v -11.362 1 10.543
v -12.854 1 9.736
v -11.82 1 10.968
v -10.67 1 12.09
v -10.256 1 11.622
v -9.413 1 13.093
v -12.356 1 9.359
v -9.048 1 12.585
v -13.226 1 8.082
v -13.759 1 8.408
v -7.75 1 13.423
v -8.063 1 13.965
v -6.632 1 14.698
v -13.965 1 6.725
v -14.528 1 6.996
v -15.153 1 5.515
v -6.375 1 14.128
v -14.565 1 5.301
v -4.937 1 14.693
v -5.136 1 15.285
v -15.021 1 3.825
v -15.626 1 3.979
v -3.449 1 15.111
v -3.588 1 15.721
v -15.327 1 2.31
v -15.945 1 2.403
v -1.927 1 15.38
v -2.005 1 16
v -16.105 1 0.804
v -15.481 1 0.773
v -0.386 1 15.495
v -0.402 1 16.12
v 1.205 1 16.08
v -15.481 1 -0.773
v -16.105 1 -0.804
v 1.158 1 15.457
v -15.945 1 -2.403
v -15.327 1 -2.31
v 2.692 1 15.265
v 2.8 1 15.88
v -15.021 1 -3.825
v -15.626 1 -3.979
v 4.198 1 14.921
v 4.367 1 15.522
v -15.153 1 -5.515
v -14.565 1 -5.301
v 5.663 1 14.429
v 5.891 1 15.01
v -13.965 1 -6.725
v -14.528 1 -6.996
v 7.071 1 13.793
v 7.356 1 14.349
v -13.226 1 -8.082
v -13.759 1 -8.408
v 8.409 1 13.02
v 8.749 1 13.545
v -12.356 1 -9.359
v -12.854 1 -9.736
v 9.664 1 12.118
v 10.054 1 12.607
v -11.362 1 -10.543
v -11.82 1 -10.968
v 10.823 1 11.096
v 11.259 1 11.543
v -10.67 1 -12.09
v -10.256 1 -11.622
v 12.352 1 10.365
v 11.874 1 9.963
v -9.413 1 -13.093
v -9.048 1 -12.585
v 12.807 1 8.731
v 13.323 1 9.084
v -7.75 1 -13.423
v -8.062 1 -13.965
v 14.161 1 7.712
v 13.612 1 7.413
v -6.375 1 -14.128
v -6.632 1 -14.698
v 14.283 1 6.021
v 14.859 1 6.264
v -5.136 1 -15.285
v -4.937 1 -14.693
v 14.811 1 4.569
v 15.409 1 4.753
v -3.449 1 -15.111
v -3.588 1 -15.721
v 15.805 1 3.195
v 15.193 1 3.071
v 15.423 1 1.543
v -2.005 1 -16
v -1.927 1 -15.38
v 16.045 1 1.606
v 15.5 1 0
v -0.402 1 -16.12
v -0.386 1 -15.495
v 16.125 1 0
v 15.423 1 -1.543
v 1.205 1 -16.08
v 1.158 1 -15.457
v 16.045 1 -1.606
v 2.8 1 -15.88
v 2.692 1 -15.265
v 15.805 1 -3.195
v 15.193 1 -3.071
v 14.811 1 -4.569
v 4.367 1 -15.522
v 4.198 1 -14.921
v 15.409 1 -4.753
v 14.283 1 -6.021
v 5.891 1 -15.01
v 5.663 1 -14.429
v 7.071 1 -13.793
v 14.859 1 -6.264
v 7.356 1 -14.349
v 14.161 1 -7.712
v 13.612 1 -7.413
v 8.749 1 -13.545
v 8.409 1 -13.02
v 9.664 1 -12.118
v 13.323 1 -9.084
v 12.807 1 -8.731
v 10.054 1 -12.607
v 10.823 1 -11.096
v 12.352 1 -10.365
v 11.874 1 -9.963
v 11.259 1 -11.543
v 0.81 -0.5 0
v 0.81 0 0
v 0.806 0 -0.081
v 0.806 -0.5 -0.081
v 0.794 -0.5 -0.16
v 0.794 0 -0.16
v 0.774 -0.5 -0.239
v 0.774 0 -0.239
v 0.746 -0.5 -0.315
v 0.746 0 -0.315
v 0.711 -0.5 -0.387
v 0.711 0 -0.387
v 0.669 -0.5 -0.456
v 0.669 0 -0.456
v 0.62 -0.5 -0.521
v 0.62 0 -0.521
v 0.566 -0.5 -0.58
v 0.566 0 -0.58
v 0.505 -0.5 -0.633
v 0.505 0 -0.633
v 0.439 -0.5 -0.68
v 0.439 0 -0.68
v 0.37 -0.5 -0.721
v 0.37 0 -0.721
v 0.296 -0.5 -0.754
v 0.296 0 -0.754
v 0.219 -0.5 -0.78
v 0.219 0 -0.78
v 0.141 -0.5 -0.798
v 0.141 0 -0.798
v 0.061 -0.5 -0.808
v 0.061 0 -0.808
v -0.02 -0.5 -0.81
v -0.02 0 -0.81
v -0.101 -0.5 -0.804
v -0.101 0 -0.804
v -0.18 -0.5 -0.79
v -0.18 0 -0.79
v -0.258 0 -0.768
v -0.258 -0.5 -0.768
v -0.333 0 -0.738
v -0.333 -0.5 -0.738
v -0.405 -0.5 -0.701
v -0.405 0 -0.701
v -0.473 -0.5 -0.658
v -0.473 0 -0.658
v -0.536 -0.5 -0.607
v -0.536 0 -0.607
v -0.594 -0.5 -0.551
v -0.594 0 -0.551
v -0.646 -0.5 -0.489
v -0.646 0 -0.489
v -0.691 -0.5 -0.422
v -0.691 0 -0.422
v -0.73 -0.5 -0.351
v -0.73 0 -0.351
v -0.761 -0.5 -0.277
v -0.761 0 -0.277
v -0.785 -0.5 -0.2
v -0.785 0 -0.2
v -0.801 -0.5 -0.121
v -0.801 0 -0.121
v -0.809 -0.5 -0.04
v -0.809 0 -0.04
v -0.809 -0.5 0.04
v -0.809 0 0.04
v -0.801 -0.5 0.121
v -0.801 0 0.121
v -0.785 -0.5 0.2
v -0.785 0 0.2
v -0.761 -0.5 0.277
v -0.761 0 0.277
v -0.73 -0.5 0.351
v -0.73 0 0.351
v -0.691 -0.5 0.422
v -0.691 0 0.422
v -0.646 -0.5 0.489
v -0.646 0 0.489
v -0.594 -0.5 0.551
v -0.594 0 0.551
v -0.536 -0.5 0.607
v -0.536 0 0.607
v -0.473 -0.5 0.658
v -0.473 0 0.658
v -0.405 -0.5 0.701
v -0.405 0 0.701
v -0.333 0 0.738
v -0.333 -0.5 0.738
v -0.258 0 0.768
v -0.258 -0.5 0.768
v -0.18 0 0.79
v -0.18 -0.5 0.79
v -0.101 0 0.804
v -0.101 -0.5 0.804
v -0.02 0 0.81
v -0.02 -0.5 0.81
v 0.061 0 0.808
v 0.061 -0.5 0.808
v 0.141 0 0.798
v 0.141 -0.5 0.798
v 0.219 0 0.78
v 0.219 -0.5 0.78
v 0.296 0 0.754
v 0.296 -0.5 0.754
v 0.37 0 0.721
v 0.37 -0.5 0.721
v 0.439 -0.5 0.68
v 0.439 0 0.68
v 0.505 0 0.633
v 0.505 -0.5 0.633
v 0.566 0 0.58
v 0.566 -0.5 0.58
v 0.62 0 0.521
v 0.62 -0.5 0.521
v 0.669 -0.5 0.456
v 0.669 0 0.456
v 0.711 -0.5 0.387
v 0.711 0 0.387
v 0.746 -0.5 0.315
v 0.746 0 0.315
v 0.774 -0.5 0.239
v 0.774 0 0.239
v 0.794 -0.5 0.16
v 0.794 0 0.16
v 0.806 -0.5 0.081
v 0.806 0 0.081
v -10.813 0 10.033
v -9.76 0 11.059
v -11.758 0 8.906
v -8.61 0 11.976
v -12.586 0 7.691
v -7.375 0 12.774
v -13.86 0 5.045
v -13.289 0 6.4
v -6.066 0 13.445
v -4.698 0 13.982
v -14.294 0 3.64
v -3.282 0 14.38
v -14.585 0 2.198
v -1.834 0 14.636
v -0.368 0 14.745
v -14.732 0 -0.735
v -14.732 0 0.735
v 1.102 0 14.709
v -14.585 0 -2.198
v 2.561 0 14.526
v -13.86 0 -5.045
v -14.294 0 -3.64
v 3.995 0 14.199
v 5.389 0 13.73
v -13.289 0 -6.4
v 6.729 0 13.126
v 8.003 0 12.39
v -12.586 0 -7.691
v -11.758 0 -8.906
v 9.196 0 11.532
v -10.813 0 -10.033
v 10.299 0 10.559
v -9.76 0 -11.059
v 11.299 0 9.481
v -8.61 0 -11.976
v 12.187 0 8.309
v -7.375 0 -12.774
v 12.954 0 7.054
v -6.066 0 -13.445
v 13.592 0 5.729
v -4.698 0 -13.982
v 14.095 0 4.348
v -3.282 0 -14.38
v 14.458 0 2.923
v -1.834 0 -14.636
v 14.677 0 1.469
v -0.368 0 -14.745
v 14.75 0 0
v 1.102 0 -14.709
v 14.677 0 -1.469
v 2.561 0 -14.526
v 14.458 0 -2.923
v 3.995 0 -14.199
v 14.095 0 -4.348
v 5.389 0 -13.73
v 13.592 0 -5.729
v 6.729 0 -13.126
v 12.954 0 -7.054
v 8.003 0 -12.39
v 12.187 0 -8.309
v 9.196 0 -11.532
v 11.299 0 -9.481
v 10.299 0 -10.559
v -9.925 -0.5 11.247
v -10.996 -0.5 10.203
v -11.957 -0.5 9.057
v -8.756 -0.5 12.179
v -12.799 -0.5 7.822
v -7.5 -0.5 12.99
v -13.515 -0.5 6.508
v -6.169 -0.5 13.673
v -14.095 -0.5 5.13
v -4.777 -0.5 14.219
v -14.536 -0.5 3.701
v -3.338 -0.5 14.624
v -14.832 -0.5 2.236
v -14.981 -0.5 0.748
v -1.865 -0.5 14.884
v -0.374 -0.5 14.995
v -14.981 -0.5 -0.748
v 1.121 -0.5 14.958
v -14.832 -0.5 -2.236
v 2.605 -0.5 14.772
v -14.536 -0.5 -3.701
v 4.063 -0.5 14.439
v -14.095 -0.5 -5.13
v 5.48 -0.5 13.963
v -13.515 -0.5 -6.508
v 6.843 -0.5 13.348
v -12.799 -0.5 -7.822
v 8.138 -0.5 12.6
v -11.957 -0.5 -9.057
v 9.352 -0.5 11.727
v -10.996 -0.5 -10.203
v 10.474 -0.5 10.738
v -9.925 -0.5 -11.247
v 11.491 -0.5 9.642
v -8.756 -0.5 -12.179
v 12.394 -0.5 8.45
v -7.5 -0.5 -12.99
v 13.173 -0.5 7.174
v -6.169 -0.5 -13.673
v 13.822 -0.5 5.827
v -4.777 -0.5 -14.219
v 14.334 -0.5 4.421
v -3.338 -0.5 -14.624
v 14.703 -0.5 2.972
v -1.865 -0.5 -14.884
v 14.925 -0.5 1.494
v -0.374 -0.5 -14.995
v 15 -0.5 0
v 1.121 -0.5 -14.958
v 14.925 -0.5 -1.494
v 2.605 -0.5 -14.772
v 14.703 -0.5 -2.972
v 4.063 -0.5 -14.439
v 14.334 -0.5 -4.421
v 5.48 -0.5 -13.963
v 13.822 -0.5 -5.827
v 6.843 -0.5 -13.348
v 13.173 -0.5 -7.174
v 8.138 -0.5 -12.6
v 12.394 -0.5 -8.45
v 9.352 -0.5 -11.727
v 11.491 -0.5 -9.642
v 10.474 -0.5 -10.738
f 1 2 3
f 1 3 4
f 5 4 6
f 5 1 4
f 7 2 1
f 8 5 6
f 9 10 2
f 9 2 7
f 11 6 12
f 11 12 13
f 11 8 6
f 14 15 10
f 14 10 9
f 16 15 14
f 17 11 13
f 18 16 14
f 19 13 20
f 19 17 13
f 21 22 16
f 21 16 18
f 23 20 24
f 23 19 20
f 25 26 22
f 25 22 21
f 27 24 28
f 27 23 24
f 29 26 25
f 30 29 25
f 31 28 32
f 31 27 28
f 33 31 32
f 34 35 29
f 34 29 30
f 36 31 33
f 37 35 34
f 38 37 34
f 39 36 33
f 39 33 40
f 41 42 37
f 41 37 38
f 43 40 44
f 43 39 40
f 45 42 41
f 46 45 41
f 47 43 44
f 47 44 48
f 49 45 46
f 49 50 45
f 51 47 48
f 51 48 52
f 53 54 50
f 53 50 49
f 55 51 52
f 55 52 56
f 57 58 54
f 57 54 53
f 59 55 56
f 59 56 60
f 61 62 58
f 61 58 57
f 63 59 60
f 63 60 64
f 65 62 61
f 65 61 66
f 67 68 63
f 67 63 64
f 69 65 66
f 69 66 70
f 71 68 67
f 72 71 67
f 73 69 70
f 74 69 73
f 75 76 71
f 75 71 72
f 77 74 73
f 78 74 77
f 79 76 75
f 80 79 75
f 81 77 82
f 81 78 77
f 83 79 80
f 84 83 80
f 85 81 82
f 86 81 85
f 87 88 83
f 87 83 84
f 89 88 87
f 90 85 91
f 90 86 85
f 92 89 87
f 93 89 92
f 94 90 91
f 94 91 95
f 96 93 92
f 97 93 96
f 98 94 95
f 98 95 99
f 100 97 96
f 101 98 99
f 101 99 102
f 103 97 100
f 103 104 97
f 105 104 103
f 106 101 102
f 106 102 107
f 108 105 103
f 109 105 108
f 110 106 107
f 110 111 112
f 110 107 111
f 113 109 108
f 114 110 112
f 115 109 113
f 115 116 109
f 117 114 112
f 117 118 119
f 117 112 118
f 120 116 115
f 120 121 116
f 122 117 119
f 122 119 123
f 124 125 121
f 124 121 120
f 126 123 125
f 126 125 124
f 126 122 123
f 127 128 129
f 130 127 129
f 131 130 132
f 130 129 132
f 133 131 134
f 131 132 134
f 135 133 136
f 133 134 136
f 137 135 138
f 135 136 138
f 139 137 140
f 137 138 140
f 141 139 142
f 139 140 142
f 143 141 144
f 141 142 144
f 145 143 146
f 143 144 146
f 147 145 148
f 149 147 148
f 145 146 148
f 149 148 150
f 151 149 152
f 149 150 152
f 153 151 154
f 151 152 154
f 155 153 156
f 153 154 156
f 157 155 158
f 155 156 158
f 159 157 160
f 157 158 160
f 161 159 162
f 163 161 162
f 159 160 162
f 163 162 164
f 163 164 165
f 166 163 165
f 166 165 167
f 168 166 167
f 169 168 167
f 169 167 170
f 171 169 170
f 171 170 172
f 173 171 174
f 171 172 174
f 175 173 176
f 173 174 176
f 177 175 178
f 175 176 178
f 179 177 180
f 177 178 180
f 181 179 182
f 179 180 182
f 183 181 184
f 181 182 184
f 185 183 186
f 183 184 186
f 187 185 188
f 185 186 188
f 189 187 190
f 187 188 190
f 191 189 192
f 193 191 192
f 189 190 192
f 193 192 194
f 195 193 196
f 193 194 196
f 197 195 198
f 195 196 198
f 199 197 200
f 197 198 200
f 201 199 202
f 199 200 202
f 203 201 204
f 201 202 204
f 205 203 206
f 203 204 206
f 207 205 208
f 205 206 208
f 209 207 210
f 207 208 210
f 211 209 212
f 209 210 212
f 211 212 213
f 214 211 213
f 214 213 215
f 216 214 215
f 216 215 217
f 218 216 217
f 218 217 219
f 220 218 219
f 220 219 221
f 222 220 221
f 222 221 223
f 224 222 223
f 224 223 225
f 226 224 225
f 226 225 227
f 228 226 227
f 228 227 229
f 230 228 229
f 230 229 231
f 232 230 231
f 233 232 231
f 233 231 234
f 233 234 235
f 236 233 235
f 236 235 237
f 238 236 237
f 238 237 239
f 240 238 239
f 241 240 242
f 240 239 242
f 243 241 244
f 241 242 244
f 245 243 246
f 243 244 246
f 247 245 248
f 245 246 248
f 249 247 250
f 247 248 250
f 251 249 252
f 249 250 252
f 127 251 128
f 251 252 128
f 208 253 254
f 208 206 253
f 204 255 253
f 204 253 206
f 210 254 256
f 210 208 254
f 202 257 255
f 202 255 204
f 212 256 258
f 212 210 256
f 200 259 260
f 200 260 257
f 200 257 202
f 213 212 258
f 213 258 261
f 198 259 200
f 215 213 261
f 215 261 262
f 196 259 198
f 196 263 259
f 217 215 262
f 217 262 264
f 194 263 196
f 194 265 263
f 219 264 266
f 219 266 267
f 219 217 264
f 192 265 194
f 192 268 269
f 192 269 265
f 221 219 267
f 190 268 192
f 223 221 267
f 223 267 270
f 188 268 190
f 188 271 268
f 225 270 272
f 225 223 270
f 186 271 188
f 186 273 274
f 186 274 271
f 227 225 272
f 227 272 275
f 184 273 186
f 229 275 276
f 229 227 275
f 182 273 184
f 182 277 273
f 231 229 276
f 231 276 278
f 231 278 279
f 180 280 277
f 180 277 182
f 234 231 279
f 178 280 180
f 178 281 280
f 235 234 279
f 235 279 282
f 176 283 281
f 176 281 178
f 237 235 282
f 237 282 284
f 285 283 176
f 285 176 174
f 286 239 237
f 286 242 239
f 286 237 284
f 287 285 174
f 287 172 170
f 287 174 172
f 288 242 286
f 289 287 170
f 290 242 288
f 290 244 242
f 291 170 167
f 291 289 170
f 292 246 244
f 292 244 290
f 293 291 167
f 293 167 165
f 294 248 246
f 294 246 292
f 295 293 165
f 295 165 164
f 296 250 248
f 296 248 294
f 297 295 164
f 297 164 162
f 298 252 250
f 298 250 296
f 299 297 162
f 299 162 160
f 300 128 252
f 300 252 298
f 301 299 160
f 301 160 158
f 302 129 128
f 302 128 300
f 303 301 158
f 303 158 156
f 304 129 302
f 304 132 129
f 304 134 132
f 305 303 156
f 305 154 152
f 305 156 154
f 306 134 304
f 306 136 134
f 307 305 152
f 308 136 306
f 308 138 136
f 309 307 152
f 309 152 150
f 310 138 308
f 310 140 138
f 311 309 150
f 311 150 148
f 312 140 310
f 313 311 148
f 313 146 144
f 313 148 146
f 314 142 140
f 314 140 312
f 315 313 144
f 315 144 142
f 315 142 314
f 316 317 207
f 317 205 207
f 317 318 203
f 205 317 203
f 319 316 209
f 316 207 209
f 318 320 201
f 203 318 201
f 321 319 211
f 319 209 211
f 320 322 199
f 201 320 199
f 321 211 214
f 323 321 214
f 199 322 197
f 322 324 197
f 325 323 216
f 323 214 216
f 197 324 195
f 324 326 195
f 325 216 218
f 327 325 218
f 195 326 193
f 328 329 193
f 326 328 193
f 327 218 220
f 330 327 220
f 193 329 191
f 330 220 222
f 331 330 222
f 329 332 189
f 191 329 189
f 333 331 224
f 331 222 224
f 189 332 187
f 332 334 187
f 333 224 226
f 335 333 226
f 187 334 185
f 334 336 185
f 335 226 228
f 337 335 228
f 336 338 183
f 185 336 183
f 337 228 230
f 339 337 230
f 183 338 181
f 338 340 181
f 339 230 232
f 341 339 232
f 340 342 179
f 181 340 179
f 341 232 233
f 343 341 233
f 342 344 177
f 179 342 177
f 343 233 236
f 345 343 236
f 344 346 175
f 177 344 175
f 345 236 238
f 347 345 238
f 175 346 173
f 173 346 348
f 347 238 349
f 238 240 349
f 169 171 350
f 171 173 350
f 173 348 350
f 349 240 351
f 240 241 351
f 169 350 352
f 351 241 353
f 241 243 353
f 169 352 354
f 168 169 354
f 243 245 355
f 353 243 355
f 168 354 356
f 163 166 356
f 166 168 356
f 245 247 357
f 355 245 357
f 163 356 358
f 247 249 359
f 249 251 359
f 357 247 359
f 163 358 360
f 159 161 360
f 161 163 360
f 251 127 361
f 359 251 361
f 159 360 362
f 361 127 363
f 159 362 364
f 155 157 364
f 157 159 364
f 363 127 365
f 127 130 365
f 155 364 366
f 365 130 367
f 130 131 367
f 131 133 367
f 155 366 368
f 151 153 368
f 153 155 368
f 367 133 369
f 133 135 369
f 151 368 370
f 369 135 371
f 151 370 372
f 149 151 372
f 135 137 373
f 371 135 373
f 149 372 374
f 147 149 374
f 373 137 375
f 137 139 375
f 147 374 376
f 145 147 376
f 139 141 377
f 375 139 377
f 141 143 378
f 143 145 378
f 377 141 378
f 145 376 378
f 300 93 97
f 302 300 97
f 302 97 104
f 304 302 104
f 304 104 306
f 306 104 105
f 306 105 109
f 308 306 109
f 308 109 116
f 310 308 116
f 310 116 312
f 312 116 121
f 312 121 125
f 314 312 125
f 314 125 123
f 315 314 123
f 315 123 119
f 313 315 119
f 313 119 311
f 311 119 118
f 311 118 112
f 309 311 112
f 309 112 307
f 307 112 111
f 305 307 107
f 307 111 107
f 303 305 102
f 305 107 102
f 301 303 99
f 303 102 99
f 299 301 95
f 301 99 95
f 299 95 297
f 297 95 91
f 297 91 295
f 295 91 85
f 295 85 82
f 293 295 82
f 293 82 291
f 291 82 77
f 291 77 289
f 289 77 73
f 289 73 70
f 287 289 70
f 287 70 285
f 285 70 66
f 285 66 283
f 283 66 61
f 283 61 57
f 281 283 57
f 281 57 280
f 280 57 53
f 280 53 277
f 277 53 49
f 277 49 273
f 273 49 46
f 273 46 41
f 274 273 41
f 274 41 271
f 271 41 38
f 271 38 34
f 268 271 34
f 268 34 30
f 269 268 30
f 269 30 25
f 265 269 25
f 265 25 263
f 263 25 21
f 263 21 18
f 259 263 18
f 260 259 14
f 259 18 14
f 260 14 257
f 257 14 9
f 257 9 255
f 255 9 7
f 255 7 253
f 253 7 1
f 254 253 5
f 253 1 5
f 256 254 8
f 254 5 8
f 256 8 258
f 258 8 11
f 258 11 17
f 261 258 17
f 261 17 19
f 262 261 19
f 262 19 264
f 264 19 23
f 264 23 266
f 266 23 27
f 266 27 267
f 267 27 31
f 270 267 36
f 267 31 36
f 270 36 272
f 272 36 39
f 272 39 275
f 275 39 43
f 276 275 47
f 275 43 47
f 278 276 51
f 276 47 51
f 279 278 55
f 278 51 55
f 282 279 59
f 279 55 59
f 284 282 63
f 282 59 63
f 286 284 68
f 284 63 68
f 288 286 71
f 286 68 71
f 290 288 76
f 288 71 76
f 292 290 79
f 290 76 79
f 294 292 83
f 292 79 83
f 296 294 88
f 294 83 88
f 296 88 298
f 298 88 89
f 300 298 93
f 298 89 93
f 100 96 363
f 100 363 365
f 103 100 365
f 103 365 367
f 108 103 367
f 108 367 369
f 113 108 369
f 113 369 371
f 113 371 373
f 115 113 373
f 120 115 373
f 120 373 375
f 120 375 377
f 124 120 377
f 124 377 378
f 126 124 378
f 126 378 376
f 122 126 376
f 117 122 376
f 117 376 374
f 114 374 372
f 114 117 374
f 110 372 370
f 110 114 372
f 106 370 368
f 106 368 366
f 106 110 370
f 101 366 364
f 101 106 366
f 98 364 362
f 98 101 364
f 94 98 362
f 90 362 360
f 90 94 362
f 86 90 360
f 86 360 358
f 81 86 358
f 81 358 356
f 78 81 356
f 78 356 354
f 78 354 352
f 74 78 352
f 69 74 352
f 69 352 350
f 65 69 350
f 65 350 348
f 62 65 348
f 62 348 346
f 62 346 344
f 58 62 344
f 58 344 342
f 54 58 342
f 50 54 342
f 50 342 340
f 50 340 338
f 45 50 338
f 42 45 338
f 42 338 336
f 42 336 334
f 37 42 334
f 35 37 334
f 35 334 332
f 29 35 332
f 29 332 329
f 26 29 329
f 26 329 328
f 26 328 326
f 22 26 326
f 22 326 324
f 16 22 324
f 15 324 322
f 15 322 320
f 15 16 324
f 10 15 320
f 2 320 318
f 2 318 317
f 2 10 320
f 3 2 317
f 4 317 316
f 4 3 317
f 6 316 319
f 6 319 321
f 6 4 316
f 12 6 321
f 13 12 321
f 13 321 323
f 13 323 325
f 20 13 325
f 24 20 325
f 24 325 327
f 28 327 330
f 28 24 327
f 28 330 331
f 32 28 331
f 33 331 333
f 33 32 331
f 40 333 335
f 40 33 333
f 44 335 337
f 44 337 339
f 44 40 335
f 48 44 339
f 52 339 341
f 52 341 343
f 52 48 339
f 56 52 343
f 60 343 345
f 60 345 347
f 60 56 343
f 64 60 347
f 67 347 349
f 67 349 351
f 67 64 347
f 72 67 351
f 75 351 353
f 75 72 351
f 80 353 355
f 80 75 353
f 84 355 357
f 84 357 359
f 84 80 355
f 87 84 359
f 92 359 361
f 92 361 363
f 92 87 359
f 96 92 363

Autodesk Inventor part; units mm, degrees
ref_plane "YZ Plane" through (0, 0, 0) normal (1, 0, 0) x (0, 1, 0)
ref_plane "XZ Plane" through (0, 0, 0) normal (0, 1, 0) x (-1, 0, 0)
ref_plane "XY Plane" through (0, 0, 0) normal (0, 0, 1) x (1, 0, 0)
sketch "Skizze1" plane through (0, 0, 0) normal (0, 0, 1) x (1, 0, 0)
  line L0 (0, 0) -> (0, 16.3048)
  line L1 (0, 0) -> (14.75, 0)
  line L2 (14.75, 0) -> (15.5, 1)
  line L3 (15.5, 1) -> (0, 1)
  dimension "d1" = 31
  dimension "d2" = 29.5
  dimension "d3" = 1
revolve "Umdrehung1" add sketch "Skizze1" angle 360 about axis through (0, 0, 0) along (0, 1, 0)
shell "Wandung1" thickness 0.5 outward yes removed faces 1 at (2.935, 1, -4.2521)
sketch "Skizze2" plane through (0, 0, 0) normal (0, 1, 0) x (1, 0, 0)
  circle A0 centre (0, 0) radius 0.81
  dimension "d5" = 1.62
extrude "Extrusion1" cut sketch "Skizze2" against normal up to surface (0.5 mm away)
properties part number "mesh filter"
